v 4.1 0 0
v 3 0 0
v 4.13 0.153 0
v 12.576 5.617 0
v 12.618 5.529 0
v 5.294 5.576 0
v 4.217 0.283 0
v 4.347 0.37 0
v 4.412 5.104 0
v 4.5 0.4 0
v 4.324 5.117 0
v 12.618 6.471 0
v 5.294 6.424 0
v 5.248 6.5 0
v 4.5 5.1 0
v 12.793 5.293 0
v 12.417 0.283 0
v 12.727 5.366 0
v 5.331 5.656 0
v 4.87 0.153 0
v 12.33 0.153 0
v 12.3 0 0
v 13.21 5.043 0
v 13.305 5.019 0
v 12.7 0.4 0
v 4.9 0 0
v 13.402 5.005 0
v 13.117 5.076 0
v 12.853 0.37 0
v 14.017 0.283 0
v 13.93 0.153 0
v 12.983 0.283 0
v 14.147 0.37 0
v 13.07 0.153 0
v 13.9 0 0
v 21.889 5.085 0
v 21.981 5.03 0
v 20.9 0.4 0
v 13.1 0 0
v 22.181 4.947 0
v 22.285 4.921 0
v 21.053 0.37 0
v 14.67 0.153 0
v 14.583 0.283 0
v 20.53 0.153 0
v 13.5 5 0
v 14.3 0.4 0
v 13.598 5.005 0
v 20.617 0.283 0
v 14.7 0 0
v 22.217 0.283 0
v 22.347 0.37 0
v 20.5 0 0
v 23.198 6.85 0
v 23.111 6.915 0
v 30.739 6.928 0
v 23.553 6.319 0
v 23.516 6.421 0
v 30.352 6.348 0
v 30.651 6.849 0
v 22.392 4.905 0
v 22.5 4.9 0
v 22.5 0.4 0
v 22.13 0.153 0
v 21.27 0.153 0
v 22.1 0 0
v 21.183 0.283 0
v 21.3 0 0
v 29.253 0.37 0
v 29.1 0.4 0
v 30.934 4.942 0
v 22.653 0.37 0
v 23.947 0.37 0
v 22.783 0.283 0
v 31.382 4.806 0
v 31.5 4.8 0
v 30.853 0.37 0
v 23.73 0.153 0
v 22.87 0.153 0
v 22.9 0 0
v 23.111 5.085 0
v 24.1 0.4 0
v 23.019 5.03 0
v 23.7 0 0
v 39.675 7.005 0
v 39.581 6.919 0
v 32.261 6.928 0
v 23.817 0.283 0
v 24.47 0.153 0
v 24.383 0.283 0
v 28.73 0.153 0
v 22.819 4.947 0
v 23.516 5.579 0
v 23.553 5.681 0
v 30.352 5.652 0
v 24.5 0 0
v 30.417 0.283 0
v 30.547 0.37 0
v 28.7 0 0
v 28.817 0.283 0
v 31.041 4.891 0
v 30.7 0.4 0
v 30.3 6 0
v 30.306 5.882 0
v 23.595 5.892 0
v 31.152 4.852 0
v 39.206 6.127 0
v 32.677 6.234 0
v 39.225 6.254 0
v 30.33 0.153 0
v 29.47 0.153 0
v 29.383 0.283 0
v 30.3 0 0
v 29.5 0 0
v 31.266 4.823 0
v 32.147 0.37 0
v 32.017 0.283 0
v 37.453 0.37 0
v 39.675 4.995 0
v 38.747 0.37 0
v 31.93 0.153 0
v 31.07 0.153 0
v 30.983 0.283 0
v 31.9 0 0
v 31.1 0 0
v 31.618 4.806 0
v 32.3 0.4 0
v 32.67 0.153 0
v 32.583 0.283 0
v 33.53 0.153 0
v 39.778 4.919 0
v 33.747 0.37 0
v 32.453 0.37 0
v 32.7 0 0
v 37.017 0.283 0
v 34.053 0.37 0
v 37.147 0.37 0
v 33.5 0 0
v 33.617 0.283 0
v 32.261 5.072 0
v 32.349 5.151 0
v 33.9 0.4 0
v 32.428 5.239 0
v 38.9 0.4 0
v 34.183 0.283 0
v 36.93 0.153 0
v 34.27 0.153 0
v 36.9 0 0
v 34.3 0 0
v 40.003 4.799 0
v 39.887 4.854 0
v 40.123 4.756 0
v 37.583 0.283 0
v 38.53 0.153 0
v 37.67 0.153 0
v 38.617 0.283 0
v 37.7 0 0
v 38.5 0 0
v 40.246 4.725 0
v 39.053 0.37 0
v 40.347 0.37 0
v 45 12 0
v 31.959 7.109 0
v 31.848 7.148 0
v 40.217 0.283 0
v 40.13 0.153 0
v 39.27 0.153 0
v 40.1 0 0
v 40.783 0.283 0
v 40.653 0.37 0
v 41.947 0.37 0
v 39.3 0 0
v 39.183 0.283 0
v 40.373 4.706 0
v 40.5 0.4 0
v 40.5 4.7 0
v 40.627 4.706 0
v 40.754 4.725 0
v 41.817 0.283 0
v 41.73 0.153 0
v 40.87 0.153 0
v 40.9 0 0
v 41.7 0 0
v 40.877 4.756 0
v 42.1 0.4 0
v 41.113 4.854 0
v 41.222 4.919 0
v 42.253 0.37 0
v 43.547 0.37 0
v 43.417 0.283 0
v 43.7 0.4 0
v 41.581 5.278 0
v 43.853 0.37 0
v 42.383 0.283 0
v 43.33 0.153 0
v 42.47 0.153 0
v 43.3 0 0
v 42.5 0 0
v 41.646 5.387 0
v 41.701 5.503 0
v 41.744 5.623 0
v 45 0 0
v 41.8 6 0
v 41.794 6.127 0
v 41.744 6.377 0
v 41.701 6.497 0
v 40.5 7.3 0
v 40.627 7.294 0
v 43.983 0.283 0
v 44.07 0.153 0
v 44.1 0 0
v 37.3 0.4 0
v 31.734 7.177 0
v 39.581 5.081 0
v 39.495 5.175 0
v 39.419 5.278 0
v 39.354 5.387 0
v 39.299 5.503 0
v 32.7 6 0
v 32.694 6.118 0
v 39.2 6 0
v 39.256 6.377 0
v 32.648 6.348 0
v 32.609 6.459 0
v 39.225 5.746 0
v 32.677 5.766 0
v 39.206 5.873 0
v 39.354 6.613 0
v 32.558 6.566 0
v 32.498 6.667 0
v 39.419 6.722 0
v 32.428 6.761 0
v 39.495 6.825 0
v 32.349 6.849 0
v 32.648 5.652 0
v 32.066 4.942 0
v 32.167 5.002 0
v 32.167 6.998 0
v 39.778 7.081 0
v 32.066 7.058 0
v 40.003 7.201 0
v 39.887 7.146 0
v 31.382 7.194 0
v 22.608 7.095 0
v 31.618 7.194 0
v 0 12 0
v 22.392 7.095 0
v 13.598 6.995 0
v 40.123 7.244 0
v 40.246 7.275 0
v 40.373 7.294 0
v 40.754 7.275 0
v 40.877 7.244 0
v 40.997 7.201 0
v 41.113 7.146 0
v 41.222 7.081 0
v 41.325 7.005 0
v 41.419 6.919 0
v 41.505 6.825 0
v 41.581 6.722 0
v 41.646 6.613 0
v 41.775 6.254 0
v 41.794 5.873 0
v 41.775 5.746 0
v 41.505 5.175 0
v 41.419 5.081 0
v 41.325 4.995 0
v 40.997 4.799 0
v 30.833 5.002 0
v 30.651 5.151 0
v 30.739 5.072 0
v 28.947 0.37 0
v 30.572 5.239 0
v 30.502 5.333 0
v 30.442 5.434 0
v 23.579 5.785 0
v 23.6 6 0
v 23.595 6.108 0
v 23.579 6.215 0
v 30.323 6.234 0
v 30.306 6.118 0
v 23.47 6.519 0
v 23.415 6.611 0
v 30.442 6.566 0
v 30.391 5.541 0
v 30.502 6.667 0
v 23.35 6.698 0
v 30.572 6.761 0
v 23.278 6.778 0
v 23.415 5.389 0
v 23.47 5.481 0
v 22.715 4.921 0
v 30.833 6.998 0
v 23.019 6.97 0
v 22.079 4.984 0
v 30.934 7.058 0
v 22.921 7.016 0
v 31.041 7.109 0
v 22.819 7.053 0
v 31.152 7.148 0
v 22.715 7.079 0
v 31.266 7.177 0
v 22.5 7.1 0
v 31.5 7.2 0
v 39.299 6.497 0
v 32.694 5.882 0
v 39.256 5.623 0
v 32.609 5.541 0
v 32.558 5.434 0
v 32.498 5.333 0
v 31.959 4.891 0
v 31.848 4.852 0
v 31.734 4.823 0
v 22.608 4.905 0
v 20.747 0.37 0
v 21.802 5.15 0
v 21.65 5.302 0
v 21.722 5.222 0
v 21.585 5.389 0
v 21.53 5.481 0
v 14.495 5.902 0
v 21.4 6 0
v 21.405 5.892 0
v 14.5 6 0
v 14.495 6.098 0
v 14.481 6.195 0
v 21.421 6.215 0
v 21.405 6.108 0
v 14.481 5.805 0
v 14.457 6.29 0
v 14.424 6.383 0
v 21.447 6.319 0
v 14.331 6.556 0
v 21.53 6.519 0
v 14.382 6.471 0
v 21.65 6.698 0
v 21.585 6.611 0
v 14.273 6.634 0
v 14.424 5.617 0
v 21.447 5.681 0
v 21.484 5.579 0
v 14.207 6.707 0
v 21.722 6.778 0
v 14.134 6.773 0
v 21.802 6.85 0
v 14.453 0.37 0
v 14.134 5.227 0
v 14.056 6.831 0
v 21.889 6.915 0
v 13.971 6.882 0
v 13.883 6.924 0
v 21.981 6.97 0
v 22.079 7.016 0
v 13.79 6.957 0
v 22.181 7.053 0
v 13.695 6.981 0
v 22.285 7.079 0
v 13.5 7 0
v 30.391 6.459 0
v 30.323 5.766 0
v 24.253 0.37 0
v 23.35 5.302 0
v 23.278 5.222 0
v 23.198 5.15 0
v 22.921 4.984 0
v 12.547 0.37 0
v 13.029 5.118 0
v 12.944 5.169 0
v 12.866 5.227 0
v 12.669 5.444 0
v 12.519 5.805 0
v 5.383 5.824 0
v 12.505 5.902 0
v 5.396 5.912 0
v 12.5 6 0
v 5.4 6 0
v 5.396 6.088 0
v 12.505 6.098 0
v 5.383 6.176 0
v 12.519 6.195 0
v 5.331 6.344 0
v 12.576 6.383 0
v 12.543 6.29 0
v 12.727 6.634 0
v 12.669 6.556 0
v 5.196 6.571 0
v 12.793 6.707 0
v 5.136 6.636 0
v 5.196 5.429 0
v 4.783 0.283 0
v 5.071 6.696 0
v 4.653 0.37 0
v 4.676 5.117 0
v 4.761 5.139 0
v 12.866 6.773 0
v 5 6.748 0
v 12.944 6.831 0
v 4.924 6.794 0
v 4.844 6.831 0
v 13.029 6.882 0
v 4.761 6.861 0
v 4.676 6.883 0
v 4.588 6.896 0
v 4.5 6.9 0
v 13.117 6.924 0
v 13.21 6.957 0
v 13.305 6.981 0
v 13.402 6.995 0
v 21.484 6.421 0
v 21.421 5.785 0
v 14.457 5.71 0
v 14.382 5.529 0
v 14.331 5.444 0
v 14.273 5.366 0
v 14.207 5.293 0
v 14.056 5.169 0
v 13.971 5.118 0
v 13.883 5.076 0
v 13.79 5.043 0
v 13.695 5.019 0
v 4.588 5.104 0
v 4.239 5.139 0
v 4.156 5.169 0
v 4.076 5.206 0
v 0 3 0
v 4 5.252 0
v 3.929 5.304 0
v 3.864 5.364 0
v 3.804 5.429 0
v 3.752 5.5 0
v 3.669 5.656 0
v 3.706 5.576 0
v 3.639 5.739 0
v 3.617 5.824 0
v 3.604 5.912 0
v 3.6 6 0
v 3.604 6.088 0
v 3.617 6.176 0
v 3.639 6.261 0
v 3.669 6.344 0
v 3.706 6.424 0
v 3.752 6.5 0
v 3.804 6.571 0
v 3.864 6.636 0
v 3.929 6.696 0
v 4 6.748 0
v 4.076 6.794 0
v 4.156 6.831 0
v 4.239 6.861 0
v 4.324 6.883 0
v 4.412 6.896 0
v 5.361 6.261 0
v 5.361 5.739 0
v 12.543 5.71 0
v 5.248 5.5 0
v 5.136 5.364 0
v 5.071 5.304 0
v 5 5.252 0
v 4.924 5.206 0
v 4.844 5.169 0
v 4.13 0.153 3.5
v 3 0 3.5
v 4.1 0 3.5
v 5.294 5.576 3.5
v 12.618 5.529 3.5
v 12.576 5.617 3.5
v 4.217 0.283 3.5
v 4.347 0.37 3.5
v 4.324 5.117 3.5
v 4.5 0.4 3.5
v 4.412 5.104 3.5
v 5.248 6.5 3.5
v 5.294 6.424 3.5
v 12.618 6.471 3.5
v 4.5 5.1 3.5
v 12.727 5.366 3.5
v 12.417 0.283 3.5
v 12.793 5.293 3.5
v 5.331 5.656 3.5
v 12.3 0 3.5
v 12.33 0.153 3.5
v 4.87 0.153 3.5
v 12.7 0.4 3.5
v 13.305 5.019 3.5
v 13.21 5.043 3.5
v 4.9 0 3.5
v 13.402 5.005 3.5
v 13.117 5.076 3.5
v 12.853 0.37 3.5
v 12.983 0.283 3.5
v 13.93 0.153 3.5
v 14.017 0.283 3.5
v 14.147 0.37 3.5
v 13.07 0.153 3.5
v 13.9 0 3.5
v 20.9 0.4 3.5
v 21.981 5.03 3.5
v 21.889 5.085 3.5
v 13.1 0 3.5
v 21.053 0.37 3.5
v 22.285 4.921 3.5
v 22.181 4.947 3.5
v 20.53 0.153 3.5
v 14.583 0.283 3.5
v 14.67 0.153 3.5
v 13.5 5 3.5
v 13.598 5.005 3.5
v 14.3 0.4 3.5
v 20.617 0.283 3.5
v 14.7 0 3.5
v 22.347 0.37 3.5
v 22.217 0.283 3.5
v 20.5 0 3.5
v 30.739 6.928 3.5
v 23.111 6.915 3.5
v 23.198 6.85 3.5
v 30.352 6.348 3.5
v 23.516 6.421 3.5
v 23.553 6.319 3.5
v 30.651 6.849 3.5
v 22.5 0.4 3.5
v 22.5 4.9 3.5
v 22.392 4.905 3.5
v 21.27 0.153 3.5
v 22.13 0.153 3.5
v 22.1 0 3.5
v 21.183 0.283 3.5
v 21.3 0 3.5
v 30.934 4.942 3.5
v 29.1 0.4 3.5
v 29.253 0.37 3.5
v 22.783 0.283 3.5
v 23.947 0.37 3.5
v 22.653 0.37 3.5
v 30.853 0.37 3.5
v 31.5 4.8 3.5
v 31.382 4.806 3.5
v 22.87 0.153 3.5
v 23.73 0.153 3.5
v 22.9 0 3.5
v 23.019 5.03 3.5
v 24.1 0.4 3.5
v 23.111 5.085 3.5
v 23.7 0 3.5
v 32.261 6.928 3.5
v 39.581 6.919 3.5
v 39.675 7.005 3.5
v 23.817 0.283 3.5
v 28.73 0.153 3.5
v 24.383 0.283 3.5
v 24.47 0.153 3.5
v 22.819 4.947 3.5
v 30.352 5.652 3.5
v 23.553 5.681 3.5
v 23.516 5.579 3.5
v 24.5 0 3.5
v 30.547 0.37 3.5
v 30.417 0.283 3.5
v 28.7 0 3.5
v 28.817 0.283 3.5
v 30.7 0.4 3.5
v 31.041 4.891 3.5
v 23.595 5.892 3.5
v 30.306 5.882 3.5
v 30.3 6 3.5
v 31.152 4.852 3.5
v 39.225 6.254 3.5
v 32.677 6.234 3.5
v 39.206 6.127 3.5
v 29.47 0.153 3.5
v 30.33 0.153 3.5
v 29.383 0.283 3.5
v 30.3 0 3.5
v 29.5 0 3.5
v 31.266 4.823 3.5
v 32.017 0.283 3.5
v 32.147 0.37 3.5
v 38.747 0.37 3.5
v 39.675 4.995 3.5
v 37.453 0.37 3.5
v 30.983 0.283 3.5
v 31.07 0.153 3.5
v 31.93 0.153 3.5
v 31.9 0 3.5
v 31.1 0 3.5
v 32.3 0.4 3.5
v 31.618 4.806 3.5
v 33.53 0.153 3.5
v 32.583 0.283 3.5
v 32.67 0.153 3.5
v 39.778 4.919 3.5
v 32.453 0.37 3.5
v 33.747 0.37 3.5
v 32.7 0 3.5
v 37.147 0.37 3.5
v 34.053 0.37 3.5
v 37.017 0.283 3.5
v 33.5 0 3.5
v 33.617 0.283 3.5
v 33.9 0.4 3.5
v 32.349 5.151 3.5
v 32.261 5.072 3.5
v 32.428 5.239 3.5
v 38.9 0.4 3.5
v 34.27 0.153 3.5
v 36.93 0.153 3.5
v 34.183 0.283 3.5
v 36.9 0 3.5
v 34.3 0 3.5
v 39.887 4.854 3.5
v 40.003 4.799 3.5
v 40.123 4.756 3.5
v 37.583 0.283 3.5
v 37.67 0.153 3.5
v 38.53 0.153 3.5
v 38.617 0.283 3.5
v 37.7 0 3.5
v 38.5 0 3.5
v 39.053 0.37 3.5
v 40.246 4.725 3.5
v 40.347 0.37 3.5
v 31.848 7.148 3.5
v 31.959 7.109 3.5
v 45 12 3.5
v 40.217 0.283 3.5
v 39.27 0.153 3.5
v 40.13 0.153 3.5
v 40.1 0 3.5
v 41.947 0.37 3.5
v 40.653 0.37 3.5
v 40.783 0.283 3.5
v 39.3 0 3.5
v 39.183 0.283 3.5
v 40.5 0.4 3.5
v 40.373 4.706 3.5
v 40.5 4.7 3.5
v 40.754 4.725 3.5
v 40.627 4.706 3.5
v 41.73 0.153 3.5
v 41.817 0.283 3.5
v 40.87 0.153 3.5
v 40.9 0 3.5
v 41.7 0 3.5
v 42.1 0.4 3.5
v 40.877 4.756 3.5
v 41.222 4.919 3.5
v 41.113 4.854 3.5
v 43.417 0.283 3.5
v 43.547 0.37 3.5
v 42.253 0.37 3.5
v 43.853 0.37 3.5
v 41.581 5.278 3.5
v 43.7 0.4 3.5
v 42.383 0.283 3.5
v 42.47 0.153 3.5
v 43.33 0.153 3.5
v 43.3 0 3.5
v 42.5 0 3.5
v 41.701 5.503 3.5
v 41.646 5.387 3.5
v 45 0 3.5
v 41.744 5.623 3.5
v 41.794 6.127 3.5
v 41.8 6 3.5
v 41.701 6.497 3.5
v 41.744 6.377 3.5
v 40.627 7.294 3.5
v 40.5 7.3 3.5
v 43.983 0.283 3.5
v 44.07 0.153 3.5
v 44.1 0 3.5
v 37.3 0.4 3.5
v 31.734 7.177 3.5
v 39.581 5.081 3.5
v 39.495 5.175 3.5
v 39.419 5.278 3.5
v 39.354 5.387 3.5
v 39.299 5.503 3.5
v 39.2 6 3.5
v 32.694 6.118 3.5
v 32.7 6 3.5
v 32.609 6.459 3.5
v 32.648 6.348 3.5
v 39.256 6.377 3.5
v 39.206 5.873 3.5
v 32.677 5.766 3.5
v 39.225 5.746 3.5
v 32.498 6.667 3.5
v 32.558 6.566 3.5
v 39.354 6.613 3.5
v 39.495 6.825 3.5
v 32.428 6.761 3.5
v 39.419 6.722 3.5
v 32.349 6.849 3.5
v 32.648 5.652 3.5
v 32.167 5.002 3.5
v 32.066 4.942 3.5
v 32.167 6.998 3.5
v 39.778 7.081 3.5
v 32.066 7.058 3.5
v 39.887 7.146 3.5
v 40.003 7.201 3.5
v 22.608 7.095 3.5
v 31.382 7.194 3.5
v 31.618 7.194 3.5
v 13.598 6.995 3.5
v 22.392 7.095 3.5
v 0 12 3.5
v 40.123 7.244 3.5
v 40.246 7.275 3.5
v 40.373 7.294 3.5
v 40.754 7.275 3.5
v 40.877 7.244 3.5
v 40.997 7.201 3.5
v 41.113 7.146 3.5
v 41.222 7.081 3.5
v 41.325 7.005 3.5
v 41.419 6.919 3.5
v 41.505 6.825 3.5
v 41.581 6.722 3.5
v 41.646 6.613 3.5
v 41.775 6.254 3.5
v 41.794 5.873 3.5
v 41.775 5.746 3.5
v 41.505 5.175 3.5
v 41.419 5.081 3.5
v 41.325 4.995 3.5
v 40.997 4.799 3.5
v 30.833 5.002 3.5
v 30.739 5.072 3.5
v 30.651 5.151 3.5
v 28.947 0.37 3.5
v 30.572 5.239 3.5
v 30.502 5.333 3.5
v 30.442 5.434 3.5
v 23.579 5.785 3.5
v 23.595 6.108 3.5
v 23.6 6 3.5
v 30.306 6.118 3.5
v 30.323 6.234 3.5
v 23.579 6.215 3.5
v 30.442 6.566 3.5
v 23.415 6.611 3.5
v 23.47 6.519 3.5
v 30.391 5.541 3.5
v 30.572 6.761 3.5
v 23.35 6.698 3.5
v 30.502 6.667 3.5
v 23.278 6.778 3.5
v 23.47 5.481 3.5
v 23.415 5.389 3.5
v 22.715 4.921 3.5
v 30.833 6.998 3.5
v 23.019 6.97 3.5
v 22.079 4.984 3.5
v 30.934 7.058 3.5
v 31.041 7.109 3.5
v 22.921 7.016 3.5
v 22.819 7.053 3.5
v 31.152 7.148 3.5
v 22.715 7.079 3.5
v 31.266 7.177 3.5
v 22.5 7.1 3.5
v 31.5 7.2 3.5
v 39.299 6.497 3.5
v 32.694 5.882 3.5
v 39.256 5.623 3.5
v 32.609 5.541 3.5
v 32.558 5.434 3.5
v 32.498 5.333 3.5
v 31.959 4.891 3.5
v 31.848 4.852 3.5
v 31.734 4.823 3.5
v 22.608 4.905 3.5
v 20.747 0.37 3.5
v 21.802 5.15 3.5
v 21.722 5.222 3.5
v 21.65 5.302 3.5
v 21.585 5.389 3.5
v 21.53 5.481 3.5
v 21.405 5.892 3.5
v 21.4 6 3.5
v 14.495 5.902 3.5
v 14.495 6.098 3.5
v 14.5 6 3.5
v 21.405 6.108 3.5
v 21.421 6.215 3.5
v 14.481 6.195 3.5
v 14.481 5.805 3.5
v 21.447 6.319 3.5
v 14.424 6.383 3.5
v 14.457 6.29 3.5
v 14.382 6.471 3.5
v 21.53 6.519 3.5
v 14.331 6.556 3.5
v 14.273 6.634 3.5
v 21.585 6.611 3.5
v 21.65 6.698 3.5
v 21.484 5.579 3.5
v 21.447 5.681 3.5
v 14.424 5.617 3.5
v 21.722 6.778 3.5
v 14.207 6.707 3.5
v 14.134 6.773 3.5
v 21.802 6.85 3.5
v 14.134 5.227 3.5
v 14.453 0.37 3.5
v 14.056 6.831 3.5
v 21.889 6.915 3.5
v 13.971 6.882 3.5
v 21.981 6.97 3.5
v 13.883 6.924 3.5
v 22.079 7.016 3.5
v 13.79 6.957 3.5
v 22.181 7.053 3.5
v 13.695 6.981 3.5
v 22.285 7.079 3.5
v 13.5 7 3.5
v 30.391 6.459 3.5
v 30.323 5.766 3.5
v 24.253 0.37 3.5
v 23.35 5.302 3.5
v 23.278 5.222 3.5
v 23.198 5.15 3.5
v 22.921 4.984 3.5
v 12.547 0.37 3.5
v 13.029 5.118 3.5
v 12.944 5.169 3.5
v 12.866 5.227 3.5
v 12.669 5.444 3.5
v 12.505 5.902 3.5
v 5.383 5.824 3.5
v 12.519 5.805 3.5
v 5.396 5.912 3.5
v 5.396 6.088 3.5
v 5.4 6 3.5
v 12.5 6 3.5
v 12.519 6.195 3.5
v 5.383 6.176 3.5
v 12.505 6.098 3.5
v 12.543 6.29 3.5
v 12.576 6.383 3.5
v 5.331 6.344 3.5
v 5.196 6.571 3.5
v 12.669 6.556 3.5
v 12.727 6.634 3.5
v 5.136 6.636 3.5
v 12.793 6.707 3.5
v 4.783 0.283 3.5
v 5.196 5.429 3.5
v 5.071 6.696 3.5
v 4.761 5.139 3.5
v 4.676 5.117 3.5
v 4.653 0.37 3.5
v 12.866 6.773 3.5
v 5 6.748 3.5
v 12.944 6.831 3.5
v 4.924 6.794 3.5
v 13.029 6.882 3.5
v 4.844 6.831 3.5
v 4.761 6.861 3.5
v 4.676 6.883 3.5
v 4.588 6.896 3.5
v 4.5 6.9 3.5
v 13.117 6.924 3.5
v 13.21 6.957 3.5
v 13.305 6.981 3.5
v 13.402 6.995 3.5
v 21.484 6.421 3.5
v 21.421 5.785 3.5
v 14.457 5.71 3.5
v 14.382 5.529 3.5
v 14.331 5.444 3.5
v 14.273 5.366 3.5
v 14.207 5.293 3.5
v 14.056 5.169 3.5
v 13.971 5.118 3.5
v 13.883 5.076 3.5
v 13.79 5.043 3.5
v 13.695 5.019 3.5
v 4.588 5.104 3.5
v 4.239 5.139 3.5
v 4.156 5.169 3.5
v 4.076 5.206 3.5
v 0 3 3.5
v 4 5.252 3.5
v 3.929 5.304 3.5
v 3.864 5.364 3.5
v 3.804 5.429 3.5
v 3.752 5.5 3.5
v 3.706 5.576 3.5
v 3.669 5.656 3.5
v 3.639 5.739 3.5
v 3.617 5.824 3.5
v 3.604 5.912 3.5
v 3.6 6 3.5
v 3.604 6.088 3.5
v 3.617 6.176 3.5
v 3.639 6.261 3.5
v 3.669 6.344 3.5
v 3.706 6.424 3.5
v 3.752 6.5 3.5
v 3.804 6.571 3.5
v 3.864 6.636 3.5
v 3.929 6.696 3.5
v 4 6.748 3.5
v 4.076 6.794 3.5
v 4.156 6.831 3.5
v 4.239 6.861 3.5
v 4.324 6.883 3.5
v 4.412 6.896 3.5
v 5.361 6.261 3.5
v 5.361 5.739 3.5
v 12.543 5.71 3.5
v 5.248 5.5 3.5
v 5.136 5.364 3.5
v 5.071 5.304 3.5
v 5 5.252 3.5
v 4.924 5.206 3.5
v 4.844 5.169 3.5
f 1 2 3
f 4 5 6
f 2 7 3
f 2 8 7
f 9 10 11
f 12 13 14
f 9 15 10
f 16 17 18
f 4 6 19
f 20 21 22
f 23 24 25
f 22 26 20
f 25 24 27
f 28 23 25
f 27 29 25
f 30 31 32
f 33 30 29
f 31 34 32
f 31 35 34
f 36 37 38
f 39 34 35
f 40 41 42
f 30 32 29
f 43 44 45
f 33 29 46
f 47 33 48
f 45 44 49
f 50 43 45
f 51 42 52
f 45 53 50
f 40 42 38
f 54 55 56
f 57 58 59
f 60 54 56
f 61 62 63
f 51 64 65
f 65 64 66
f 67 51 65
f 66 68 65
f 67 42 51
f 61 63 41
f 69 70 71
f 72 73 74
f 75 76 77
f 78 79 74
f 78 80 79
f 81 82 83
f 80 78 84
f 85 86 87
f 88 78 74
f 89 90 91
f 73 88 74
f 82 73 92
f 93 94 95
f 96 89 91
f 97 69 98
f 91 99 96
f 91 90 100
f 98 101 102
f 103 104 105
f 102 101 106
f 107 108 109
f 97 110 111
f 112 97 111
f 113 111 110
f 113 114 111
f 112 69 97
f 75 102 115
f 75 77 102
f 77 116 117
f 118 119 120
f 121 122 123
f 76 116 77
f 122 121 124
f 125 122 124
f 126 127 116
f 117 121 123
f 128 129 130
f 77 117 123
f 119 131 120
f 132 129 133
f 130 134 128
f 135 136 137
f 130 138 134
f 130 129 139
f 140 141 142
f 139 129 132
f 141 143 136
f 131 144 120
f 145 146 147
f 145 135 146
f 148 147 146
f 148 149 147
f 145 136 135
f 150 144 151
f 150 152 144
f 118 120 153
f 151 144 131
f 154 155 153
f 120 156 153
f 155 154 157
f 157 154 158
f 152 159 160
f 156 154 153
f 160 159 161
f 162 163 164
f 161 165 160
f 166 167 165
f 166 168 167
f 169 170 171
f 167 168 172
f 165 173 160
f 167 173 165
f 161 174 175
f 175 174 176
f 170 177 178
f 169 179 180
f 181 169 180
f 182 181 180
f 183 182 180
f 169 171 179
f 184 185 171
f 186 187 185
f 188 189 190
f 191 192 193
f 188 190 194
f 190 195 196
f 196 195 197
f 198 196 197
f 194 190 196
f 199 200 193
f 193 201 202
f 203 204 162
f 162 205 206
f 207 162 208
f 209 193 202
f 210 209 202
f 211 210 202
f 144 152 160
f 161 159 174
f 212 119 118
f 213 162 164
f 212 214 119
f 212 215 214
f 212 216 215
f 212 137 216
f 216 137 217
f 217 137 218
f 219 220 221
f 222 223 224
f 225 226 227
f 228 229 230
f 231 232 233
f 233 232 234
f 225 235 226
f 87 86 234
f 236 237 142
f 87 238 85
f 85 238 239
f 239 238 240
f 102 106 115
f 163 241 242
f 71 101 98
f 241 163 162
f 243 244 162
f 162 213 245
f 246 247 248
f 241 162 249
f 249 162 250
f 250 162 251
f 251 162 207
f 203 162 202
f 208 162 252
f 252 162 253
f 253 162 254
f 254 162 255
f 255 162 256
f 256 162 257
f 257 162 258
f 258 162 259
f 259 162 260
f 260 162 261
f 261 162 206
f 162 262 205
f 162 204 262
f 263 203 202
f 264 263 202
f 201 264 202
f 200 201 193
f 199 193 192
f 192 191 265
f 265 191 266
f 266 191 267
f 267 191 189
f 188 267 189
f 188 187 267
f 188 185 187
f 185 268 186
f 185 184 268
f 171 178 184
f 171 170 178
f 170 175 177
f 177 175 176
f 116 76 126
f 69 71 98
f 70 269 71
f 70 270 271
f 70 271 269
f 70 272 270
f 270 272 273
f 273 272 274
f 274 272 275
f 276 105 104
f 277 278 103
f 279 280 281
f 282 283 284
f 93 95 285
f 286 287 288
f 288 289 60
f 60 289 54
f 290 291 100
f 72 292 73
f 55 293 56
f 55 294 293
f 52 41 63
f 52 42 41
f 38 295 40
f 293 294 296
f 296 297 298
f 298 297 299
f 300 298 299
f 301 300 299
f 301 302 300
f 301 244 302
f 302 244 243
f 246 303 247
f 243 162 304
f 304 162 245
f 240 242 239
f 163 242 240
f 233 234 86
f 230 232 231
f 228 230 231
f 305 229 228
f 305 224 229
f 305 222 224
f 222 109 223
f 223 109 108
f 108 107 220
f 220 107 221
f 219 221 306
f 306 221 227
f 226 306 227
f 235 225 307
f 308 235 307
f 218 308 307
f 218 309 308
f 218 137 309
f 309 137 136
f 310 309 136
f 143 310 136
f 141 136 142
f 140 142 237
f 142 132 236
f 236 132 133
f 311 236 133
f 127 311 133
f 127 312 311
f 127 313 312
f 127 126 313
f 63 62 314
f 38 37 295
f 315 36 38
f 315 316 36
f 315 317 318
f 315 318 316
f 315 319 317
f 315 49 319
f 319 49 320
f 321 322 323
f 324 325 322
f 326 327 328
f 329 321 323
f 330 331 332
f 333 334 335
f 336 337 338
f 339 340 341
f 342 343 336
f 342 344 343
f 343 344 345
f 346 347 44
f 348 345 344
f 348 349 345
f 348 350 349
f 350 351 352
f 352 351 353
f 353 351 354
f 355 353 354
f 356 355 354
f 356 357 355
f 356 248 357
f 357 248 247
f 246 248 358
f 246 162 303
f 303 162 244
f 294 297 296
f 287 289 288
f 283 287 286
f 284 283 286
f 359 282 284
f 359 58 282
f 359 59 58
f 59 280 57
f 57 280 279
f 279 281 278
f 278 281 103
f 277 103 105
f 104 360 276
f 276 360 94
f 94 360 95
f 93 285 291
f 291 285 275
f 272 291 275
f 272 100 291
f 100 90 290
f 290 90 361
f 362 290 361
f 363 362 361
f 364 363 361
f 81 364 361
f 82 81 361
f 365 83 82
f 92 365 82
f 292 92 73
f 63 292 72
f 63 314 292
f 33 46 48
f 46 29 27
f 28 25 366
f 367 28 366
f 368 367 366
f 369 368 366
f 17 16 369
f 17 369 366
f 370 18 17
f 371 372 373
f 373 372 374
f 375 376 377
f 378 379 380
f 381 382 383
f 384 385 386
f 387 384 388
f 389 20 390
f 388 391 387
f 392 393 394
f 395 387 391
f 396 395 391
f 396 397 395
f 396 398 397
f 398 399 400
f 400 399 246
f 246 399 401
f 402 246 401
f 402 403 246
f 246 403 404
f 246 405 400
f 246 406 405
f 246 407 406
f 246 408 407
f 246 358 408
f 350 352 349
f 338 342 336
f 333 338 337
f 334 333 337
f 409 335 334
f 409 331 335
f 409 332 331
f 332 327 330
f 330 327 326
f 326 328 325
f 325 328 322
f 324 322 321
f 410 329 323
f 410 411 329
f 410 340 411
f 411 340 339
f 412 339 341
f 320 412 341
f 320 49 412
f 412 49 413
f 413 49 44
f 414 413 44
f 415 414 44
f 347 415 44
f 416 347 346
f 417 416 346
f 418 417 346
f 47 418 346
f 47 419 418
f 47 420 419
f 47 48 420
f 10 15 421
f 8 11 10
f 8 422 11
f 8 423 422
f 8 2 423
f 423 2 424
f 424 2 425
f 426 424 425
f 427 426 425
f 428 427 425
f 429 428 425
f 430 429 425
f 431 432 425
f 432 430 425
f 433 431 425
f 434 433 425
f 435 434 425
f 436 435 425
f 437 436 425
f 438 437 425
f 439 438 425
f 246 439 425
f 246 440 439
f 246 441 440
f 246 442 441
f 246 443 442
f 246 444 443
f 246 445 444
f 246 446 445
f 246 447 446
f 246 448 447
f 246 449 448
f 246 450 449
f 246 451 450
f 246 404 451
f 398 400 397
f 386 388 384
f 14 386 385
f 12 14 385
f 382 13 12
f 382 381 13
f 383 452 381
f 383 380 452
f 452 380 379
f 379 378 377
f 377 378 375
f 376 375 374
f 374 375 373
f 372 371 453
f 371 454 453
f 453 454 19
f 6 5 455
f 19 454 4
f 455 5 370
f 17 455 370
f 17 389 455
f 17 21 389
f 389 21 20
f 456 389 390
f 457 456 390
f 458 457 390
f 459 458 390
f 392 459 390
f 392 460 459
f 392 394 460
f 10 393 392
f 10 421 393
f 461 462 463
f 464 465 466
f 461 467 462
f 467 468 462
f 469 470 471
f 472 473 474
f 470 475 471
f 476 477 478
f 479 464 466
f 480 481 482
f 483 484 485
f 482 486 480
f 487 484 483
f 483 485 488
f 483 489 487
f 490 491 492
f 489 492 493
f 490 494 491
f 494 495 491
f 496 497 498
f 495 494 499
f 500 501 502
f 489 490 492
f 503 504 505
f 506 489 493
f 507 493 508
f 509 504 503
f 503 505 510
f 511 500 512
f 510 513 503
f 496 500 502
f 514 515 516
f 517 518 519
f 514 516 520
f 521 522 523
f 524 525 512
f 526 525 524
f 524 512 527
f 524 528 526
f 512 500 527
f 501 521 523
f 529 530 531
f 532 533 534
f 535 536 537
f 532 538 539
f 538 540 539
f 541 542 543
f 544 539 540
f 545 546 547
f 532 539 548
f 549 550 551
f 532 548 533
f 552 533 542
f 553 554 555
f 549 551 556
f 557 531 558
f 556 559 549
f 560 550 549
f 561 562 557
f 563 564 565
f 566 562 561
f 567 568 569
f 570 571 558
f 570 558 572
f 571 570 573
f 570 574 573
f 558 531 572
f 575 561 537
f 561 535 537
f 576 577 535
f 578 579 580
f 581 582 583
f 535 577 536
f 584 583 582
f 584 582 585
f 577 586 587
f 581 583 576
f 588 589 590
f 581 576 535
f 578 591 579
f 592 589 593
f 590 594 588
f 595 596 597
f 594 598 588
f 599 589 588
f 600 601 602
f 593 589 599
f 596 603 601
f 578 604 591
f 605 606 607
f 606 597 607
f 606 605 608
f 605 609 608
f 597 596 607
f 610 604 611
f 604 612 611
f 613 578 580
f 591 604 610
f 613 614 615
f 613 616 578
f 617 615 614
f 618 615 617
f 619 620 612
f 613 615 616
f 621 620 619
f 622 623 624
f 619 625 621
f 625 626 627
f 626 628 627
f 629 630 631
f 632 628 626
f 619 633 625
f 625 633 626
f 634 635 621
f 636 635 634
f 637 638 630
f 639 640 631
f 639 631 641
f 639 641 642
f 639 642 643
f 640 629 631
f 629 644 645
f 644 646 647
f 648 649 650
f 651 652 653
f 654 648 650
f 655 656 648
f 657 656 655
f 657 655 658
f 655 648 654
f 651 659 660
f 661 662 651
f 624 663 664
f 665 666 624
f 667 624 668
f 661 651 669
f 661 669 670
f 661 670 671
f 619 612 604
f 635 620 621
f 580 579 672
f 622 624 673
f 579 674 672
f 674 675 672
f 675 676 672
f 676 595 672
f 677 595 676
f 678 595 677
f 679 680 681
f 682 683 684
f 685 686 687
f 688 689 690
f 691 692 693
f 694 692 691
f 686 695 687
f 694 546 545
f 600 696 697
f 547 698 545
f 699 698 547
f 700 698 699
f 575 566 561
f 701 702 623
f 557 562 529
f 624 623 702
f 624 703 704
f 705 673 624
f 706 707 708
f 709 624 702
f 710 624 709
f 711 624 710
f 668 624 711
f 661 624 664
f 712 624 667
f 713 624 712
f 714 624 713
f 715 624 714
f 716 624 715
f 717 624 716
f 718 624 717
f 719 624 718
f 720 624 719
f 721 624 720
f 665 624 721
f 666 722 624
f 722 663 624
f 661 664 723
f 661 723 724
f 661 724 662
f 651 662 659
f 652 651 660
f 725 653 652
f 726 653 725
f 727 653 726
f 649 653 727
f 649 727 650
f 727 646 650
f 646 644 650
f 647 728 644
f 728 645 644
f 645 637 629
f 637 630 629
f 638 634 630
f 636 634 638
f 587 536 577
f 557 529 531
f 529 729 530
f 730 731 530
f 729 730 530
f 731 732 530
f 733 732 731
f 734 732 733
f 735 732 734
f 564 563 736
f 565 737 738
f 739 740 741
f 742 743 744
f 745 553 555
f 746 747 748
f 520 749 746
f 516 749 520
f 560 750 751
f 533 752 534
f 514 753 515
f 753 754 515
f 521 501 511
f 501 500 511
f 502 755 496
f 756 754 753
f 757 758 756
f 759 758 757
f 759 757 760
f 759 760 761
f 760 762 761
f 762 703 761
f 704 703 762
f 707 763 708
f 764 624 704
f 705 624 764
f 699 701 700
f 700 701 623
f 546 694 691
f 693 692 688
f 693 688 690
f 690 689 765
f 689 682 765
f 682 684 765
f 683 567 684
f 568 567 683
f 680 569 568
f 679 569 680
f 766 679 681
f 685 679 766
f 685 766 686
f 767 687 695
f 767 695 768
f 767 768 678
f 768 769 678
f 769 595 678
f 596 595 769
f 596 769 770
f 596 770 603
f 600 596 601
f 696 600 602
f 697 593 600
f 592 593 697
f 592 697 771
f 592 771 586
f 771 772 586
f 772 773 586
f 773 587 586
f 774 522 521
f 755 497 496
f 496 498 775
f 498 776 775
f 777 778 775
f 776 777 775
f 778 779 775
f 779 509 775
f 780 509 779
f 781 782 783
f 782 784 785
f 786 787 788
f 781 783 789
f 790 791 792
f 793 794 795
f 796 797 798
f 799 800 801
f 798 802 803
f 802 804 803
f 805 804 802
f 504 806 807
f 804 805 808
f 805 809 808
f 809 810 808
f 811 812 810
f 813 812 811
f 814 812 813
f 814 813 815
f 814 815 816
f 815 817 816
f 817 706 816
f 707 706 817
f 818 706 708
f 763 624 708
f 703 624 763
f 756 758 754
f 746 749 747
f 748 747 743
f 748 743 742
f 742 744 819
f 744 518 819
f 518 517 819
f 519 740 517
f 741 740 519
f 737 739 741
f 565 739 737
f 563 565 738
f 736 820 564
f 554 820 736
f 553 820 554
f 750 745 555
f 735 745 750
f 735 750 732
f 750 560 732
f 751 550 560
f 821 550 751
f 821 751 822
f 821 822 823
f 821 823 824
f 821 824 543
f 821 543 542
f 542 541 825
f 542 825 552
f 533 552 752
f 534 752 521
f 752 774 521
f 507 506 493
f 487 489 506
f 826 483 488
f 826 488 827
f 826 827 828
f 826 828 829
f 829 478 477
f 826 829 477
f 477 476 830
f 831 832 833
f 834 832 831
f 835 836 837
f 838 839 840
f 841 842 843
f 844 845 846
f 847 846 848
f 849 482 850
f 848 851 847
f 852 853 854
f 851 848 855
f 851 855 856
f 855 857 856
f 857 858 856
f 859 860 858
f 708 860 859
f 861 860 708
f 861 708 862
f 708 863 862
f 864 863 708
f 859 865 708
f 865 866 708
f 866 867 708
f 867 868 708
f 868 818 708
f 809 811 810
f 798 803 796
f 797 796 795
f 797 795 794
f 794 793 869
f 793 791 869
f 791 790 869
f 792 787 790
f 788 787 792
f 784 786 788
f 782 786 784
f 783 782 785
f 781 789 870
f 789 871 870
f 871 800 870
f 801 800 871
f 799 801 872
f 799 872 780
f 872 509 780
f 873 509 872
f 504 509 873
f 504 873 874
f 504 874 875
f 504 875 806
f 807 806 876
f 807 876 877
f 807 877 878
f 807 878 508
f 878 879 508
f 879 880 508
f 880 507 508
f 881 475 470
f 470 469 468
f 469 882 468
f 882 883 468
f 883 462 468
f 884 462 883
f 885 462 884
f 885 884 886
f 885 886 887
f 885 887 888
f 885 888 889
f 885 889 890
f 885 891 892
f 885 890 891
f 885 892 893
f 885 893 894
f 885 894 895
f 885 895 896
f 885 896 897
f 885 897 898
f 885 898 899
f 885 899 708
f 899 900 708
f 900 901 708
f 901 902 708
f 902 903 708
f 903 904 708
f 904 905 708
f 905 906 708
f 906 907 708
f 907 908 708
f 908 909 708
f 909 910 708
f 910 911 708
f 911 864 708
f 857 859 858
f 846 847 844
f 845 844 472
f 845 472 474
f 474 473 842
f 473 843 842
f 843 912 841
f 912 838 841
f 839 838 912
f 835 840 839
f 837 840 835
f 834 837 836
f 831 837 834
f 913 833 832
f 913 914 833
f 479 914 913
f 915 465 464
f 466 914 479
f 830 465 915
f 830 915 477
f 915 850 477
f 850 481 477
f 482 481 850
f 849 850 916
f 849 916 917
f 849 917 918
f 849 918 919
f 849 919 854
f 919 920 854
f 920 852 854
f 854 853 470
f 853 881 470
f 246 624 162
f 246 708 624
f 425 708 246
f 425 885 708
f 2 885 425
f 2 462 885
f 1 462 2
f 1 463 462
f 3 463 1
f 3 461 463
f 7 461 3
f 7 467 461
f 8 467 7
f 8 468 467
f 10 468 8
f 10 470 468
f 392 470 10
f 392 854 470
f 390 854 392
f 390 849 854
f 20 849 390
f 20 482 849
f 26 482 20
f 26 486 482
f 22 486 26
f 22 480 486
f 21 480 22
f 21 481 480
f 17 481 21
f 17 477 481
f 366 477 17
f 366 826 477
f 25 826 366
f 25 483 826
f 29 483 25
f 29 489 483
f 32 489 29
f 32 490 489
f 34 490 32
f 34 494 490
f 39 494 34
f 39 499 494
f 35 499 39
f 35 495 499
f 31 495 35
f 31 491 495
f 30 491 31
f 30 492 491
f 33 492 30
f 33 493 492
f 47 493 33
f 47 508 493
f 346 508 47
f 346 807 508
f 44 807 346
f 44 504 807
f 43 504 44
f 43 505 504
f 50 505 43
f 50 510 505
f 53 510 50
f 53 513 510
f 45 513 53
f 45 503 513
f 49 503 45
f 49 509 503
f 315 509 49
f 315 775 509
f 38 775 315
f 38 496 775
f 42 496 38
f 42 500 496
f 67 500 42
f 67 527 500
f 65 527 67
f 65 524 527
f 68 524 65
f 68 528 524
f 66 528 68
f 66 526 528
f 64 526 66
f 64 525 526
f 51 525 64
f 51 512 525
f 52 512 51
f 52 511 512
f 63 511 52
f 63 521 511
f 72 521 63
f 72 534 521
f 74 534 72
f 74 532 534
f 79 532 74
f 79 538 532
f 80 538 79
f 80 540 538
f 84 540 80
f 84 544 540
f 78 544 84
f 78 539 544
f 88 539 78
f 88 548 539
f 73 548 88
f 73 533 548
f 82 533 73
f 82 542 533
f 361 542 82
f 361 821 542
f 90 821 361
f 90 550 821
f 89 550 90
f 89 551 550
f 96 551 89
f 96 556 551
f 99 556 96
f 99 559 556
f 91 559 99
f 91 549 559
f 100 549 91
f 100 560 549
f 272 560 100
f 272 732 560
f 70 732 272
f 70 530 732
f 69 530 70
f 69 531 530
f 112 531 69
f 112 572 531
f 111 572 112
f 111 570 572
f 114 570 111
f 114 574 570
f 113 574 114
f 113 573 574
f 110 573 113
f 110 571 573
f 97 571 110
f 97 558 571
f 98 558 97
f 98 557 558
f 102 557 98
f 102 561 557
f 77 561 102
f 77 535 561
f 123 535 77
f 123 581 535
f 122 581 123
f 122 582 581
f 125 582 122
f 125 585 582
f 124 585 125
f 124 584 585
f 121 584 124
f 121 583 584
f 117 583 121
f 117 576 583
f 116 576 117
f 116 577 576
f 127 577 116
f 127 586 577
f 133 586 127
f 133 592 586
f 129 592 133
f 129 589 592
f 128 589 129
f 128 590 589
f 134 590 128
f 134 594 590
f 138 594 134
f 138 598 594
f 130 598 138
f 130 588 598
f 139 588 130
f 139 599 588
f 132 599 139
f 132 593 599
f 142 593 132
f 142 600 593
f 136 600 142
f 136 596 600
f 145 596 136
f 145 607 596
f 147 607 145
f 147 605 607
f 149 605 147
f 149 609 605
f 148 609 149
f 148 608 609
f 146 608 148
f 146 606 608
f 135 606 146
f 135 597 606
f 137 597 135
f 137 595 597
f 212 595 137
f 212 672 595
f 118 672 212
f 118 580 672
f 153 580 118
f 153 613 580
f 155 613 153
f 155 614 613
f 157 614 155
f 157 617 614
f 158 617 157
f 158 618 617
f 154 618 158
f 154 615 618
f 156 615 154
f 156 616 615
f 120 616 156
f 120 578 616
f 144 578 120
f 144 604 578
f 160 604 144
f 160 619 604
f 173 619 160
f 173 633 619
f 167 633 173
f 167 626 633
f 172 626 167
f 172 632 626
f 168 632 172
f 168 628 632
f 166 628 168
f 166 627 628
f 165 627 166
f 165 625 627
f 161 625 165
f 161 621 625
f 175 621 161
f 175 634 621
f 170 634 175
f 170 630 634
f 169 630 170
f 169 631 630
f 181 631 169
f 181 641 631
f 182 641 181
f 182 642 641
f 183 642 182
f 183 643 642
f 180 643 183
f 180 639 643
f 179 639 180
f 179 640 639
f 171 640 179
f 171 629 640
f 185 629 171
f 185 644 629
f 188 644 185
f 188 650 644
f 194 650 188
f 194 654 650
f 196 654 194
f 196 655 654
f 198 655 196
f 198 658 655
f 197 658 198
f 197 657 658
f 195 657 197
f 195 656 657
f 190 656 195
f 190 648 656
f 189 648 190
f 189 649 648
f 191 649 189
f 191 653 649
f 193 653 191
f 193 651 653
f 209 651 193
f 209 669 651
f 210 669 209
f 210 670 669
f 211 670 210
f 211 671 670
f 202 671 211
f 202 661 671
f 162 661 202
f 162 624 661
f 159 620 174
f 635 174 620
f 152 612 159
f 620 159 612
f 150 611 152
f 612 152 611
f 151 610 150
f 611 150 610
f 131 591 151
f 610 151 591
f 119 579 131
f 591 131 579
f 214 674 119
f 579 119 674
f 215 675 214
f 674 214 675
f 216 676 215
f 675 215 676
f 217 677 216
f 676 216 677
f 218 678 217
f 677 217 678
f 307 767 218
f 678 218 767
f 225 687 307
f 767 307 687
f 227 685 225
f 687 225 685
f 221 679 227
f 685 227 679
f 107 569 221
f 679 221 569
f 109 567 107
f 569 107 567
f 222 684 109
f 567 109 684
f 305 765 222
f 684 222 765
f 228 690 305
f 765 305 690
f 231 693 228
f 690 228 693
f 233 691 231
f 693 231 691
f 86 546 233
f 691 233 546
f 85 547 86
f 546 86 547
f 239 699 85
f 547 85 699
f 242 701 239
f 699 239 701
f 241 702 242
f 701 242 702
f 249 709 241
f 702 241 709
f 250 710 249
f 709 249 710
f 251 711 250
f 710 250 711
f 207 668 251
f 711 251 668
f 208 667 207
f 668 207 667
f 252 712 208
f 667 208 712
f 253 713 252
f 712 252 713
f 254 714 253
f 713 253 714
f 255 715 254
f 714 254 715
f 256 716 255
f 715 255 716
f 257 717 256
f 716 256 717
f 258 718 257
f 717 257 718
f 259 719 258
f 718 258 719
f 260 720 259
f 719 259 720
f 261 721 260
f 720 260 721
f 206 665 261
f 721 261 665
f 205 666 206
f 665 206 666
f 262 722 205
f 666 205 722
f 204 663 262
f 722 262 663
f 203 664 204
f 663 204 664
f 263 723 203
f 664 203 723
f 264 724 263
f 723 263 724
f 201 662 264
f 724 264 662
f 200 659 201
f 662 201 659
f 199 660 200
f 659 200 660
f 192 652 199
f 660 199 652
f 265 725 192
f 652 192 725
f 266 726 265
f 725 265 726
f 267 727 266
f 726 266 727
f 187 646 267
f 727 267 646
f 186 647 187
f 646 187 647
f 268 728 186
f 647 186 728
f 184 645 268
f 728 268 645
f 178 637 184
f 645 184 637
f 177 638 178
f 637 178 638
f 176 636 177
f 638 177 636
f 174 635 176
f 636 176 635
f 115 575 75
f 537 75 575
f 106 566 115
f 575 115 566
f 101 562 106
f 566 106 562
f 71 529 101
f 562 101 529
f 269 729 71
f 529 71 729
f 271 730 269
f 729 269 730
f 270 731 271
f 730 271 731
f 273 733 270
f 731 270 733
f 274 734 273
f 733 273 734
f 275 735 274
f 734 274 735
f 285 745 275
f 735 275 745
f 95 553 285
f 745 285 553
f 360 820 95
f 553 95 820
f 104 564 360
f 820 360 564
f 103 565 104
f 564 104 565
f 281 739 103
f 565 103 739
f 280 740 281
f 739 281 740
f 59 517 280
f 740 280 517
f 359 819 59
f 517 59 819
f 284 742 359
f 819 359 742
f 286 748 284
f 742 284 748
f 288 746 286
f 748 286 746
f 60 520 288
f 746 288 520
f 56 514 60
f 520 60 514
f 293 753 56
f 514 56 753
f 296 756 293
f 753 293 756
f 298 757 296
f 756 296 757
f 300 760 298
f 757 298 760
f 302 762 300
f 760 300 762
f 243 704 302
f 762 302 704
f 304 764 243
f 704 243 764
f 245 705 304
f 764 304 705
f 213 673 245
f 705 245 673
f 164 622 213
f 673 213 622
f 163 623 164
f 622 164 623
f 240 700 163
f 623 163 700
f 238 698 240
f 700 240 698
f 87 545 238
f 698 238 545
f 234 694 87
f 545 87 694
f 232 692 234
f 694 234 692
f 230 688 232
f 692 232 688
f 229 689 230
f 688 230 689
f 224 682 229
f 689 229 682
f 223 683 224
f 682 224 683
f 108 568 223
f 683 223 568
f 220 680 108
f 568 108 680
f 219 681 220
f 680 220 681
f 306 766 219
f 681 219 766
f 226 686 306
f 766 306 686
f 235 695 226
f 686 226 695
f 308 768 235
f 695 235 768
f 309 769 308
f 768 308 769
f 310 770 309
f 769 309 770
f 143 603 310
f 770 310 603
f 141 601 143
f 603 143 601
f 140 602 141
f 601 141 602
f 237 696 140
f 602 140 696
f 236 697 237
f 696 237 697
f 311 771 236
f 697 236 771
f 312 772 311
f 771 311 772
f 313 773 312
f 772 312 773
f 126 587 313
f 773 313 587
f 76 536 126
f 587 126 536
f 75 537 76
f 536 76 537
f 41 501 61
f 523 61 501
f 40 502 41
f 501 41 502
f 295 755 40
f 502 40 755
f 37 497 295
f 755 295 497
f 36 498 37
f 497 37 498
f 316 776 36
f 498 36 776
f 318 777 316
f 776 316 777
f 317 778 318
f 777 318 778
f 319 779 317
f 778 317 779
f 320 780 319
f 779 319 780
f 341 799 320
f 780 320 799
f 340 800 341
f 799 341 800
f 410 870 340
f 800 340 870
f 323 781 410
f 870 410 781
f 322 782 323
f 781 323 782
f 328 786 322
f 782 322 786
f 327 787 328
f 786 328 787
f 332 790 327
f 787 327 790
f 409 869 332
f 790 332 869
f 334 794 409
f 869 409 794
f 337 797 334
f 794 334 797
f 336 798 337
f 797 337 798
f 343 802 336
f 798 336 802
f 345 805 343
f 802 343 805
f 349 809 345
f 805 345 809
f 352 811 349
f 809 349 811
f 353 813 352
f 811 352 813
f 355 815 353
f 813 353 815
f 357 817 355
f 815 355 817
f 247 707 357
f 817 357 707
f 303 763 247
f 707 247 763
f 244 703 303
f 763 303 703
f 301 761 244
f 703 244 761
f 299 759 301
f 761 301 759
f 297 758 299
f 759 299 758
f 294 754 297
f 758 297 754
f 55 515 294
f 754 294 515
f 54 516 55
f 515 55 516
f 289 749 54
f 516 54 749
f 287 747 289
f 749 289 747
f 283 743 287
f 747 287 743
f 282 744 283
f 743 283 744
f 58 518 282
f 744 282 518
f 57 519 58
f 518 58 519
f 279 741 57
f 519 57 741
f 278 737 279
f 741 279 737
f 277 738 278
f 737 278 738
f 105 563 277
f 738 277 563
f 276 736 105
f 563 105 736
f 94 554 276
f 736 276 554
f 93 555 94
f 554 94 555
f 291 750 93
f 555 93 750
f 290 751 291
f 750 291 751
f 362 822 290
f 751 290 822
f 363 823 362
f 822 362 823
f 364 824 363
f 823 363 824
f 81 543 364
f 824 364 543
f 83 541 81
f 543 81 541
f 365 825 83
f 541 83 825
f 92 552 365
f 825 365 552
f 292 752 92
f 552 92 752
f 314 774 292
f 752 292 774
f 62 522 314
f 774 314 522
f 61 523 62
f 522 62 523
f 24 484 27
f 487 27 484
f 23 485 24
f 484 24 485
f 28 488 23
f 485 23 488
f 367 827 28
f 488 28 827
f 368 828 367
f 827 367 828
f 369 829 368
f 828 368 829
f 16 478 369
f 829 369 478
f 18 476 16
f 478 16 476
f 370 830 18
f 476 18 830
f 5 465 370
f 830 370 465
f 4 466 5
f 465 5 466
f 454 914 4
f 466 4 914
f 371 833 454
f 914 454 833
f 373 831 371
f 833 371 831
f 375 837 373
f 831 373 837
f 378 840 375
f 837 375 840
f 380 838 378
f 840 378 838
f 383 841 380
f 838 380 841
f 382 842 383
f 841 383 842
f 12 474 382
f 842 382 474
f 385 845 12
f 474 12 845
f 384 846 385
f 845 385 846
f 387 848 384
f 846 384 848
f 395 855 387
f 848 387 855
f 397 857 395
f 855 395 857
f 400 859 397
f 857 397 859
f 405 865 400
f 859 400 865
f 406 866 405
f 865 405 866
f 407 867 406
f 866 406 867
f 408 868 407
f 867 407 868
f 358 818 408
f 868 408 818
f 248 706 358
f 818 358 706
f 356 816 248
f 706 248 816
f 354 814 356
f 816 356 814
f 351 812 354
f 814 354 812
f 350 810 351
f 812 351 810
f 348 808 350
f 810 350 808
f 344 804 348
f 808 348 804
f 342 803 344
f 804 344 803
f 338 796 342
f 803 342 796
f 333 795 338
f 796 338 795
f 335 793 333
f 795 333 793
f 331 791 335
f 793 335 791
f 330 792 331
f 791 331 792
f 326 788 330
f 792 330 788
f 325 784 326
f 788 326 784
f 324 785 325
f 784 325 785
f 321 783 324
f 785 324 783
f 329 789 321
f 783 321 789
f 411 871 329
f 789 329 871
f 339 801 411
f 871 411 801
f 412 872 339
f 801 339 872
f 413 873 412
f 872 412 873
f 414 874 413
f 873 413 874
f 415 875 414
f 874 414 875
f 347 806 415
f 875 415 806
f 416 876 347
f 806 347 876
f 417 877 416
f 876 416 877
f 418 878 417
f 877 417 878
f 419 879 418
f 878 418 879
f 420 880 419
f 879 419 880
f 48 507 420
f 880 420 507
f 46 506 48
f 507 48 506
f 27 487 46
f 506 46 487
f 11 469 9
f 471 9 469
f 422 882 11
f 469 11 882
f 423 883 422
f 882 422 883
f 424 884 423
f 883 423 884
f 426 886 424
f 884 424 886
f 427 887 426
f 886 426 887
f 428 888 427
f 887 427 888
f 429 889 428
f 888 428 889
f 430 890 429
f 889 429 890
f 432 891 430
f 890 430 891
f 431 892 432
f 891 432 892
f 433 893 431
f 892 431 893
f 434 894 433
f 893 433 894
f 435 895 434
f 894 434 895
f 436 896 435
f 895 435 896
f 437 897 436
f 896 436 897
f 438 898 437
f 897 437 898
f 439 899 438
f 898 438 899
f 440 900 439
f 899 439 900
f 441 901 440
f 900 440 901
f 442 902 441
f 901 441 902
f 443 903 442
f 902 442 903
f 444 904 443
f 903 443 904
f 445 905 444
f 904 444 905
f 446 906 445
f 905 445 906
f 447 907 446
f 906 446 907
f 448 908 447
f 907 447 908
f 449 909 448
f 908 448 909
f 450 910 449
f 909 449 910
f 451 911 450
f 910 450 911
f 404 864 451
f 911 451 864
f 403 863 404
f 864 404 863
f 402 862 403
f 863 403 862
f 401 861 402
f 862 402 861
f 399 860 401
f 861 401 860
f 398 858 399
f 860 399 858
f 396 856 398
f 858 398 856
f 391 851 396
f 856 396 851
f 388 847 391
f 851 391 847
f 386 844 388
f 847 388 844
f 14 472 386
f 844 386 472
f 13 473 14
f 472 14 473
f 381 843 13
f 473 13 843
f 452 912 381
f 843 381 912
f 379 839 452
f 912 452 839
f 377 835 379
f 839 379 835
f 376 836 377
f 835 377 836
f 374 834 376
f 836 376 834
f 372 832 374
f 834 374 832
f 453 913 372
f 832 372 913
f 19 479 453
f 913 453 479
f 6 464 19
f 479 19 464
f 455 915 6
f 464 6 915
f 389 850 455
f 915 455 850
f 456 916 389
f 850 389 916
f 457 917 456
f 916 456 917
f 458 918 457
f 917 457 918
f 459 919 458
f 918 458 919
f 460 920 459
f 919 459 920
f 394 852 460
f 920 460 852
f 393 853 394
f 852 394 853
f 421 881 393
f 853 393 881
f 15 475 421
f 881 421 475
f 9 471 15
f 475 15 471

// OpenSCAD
// M2 セルフタッピング下穴の印刷ゲージ。
// 設計径 1.8〜2.6mm（0.2 刻み）の貫通穴を servo_plate_t 厚の板に並べる。
// 印刷して M2 を順にねじ込み、「しっかり効くが割れない」穴の設計値を
// servo_screw_pilot に採用する（プリンタの小径穴収縮を実測で補正する）。
// 小径側の端は角を落としてあるので、面取り側が 1.8mm。
// 印刷向きは本番同等（板をベッドに水平、穴は縦穴）。

include <params.scad>

gauge_ds    = [1.8, 2.0, 2.2, 2.4, 2.6]; // 穴の設計径。面取り角に近い方から
gauge_pitch = 9;                          // 穴の中心間隔
gauge_w     = 12;                         // 板の幅
gauge_chamfer = 3;                        // 小径側マーカーの角落とし

len_x = gauge_pitch * len(gauge_ds);

linear_extrude(height = servo_plate_t)
  difference() {
    polygon([
      [gauge_chamfer, 0], [len_x, 0], [len_x, gauge_w],
      [0, gauge_w], [0, gauge_chamfer],
    ]);
    for (i = [0 : len(gauge_ds) - 1])
      translate([gauge_pitch * (i + 0.5), gauge_w / 2])
        circle(d = gauge_ds[i]);
    // 各穴の下に設計径×10 本…は多すぎるので、穴数ぶんの刻みノッチ
    // （左から i+1 個）で順番を機械的に判別できるようにする
    for (i = [0 : len(gauge_ds) - 1], t = [0 : i])
      translate([gauge_pitch * (i + 0.5) + (t - i / 2) * 1.6, 0])
        circle(d = 0.8, $fn = 16);
  }
